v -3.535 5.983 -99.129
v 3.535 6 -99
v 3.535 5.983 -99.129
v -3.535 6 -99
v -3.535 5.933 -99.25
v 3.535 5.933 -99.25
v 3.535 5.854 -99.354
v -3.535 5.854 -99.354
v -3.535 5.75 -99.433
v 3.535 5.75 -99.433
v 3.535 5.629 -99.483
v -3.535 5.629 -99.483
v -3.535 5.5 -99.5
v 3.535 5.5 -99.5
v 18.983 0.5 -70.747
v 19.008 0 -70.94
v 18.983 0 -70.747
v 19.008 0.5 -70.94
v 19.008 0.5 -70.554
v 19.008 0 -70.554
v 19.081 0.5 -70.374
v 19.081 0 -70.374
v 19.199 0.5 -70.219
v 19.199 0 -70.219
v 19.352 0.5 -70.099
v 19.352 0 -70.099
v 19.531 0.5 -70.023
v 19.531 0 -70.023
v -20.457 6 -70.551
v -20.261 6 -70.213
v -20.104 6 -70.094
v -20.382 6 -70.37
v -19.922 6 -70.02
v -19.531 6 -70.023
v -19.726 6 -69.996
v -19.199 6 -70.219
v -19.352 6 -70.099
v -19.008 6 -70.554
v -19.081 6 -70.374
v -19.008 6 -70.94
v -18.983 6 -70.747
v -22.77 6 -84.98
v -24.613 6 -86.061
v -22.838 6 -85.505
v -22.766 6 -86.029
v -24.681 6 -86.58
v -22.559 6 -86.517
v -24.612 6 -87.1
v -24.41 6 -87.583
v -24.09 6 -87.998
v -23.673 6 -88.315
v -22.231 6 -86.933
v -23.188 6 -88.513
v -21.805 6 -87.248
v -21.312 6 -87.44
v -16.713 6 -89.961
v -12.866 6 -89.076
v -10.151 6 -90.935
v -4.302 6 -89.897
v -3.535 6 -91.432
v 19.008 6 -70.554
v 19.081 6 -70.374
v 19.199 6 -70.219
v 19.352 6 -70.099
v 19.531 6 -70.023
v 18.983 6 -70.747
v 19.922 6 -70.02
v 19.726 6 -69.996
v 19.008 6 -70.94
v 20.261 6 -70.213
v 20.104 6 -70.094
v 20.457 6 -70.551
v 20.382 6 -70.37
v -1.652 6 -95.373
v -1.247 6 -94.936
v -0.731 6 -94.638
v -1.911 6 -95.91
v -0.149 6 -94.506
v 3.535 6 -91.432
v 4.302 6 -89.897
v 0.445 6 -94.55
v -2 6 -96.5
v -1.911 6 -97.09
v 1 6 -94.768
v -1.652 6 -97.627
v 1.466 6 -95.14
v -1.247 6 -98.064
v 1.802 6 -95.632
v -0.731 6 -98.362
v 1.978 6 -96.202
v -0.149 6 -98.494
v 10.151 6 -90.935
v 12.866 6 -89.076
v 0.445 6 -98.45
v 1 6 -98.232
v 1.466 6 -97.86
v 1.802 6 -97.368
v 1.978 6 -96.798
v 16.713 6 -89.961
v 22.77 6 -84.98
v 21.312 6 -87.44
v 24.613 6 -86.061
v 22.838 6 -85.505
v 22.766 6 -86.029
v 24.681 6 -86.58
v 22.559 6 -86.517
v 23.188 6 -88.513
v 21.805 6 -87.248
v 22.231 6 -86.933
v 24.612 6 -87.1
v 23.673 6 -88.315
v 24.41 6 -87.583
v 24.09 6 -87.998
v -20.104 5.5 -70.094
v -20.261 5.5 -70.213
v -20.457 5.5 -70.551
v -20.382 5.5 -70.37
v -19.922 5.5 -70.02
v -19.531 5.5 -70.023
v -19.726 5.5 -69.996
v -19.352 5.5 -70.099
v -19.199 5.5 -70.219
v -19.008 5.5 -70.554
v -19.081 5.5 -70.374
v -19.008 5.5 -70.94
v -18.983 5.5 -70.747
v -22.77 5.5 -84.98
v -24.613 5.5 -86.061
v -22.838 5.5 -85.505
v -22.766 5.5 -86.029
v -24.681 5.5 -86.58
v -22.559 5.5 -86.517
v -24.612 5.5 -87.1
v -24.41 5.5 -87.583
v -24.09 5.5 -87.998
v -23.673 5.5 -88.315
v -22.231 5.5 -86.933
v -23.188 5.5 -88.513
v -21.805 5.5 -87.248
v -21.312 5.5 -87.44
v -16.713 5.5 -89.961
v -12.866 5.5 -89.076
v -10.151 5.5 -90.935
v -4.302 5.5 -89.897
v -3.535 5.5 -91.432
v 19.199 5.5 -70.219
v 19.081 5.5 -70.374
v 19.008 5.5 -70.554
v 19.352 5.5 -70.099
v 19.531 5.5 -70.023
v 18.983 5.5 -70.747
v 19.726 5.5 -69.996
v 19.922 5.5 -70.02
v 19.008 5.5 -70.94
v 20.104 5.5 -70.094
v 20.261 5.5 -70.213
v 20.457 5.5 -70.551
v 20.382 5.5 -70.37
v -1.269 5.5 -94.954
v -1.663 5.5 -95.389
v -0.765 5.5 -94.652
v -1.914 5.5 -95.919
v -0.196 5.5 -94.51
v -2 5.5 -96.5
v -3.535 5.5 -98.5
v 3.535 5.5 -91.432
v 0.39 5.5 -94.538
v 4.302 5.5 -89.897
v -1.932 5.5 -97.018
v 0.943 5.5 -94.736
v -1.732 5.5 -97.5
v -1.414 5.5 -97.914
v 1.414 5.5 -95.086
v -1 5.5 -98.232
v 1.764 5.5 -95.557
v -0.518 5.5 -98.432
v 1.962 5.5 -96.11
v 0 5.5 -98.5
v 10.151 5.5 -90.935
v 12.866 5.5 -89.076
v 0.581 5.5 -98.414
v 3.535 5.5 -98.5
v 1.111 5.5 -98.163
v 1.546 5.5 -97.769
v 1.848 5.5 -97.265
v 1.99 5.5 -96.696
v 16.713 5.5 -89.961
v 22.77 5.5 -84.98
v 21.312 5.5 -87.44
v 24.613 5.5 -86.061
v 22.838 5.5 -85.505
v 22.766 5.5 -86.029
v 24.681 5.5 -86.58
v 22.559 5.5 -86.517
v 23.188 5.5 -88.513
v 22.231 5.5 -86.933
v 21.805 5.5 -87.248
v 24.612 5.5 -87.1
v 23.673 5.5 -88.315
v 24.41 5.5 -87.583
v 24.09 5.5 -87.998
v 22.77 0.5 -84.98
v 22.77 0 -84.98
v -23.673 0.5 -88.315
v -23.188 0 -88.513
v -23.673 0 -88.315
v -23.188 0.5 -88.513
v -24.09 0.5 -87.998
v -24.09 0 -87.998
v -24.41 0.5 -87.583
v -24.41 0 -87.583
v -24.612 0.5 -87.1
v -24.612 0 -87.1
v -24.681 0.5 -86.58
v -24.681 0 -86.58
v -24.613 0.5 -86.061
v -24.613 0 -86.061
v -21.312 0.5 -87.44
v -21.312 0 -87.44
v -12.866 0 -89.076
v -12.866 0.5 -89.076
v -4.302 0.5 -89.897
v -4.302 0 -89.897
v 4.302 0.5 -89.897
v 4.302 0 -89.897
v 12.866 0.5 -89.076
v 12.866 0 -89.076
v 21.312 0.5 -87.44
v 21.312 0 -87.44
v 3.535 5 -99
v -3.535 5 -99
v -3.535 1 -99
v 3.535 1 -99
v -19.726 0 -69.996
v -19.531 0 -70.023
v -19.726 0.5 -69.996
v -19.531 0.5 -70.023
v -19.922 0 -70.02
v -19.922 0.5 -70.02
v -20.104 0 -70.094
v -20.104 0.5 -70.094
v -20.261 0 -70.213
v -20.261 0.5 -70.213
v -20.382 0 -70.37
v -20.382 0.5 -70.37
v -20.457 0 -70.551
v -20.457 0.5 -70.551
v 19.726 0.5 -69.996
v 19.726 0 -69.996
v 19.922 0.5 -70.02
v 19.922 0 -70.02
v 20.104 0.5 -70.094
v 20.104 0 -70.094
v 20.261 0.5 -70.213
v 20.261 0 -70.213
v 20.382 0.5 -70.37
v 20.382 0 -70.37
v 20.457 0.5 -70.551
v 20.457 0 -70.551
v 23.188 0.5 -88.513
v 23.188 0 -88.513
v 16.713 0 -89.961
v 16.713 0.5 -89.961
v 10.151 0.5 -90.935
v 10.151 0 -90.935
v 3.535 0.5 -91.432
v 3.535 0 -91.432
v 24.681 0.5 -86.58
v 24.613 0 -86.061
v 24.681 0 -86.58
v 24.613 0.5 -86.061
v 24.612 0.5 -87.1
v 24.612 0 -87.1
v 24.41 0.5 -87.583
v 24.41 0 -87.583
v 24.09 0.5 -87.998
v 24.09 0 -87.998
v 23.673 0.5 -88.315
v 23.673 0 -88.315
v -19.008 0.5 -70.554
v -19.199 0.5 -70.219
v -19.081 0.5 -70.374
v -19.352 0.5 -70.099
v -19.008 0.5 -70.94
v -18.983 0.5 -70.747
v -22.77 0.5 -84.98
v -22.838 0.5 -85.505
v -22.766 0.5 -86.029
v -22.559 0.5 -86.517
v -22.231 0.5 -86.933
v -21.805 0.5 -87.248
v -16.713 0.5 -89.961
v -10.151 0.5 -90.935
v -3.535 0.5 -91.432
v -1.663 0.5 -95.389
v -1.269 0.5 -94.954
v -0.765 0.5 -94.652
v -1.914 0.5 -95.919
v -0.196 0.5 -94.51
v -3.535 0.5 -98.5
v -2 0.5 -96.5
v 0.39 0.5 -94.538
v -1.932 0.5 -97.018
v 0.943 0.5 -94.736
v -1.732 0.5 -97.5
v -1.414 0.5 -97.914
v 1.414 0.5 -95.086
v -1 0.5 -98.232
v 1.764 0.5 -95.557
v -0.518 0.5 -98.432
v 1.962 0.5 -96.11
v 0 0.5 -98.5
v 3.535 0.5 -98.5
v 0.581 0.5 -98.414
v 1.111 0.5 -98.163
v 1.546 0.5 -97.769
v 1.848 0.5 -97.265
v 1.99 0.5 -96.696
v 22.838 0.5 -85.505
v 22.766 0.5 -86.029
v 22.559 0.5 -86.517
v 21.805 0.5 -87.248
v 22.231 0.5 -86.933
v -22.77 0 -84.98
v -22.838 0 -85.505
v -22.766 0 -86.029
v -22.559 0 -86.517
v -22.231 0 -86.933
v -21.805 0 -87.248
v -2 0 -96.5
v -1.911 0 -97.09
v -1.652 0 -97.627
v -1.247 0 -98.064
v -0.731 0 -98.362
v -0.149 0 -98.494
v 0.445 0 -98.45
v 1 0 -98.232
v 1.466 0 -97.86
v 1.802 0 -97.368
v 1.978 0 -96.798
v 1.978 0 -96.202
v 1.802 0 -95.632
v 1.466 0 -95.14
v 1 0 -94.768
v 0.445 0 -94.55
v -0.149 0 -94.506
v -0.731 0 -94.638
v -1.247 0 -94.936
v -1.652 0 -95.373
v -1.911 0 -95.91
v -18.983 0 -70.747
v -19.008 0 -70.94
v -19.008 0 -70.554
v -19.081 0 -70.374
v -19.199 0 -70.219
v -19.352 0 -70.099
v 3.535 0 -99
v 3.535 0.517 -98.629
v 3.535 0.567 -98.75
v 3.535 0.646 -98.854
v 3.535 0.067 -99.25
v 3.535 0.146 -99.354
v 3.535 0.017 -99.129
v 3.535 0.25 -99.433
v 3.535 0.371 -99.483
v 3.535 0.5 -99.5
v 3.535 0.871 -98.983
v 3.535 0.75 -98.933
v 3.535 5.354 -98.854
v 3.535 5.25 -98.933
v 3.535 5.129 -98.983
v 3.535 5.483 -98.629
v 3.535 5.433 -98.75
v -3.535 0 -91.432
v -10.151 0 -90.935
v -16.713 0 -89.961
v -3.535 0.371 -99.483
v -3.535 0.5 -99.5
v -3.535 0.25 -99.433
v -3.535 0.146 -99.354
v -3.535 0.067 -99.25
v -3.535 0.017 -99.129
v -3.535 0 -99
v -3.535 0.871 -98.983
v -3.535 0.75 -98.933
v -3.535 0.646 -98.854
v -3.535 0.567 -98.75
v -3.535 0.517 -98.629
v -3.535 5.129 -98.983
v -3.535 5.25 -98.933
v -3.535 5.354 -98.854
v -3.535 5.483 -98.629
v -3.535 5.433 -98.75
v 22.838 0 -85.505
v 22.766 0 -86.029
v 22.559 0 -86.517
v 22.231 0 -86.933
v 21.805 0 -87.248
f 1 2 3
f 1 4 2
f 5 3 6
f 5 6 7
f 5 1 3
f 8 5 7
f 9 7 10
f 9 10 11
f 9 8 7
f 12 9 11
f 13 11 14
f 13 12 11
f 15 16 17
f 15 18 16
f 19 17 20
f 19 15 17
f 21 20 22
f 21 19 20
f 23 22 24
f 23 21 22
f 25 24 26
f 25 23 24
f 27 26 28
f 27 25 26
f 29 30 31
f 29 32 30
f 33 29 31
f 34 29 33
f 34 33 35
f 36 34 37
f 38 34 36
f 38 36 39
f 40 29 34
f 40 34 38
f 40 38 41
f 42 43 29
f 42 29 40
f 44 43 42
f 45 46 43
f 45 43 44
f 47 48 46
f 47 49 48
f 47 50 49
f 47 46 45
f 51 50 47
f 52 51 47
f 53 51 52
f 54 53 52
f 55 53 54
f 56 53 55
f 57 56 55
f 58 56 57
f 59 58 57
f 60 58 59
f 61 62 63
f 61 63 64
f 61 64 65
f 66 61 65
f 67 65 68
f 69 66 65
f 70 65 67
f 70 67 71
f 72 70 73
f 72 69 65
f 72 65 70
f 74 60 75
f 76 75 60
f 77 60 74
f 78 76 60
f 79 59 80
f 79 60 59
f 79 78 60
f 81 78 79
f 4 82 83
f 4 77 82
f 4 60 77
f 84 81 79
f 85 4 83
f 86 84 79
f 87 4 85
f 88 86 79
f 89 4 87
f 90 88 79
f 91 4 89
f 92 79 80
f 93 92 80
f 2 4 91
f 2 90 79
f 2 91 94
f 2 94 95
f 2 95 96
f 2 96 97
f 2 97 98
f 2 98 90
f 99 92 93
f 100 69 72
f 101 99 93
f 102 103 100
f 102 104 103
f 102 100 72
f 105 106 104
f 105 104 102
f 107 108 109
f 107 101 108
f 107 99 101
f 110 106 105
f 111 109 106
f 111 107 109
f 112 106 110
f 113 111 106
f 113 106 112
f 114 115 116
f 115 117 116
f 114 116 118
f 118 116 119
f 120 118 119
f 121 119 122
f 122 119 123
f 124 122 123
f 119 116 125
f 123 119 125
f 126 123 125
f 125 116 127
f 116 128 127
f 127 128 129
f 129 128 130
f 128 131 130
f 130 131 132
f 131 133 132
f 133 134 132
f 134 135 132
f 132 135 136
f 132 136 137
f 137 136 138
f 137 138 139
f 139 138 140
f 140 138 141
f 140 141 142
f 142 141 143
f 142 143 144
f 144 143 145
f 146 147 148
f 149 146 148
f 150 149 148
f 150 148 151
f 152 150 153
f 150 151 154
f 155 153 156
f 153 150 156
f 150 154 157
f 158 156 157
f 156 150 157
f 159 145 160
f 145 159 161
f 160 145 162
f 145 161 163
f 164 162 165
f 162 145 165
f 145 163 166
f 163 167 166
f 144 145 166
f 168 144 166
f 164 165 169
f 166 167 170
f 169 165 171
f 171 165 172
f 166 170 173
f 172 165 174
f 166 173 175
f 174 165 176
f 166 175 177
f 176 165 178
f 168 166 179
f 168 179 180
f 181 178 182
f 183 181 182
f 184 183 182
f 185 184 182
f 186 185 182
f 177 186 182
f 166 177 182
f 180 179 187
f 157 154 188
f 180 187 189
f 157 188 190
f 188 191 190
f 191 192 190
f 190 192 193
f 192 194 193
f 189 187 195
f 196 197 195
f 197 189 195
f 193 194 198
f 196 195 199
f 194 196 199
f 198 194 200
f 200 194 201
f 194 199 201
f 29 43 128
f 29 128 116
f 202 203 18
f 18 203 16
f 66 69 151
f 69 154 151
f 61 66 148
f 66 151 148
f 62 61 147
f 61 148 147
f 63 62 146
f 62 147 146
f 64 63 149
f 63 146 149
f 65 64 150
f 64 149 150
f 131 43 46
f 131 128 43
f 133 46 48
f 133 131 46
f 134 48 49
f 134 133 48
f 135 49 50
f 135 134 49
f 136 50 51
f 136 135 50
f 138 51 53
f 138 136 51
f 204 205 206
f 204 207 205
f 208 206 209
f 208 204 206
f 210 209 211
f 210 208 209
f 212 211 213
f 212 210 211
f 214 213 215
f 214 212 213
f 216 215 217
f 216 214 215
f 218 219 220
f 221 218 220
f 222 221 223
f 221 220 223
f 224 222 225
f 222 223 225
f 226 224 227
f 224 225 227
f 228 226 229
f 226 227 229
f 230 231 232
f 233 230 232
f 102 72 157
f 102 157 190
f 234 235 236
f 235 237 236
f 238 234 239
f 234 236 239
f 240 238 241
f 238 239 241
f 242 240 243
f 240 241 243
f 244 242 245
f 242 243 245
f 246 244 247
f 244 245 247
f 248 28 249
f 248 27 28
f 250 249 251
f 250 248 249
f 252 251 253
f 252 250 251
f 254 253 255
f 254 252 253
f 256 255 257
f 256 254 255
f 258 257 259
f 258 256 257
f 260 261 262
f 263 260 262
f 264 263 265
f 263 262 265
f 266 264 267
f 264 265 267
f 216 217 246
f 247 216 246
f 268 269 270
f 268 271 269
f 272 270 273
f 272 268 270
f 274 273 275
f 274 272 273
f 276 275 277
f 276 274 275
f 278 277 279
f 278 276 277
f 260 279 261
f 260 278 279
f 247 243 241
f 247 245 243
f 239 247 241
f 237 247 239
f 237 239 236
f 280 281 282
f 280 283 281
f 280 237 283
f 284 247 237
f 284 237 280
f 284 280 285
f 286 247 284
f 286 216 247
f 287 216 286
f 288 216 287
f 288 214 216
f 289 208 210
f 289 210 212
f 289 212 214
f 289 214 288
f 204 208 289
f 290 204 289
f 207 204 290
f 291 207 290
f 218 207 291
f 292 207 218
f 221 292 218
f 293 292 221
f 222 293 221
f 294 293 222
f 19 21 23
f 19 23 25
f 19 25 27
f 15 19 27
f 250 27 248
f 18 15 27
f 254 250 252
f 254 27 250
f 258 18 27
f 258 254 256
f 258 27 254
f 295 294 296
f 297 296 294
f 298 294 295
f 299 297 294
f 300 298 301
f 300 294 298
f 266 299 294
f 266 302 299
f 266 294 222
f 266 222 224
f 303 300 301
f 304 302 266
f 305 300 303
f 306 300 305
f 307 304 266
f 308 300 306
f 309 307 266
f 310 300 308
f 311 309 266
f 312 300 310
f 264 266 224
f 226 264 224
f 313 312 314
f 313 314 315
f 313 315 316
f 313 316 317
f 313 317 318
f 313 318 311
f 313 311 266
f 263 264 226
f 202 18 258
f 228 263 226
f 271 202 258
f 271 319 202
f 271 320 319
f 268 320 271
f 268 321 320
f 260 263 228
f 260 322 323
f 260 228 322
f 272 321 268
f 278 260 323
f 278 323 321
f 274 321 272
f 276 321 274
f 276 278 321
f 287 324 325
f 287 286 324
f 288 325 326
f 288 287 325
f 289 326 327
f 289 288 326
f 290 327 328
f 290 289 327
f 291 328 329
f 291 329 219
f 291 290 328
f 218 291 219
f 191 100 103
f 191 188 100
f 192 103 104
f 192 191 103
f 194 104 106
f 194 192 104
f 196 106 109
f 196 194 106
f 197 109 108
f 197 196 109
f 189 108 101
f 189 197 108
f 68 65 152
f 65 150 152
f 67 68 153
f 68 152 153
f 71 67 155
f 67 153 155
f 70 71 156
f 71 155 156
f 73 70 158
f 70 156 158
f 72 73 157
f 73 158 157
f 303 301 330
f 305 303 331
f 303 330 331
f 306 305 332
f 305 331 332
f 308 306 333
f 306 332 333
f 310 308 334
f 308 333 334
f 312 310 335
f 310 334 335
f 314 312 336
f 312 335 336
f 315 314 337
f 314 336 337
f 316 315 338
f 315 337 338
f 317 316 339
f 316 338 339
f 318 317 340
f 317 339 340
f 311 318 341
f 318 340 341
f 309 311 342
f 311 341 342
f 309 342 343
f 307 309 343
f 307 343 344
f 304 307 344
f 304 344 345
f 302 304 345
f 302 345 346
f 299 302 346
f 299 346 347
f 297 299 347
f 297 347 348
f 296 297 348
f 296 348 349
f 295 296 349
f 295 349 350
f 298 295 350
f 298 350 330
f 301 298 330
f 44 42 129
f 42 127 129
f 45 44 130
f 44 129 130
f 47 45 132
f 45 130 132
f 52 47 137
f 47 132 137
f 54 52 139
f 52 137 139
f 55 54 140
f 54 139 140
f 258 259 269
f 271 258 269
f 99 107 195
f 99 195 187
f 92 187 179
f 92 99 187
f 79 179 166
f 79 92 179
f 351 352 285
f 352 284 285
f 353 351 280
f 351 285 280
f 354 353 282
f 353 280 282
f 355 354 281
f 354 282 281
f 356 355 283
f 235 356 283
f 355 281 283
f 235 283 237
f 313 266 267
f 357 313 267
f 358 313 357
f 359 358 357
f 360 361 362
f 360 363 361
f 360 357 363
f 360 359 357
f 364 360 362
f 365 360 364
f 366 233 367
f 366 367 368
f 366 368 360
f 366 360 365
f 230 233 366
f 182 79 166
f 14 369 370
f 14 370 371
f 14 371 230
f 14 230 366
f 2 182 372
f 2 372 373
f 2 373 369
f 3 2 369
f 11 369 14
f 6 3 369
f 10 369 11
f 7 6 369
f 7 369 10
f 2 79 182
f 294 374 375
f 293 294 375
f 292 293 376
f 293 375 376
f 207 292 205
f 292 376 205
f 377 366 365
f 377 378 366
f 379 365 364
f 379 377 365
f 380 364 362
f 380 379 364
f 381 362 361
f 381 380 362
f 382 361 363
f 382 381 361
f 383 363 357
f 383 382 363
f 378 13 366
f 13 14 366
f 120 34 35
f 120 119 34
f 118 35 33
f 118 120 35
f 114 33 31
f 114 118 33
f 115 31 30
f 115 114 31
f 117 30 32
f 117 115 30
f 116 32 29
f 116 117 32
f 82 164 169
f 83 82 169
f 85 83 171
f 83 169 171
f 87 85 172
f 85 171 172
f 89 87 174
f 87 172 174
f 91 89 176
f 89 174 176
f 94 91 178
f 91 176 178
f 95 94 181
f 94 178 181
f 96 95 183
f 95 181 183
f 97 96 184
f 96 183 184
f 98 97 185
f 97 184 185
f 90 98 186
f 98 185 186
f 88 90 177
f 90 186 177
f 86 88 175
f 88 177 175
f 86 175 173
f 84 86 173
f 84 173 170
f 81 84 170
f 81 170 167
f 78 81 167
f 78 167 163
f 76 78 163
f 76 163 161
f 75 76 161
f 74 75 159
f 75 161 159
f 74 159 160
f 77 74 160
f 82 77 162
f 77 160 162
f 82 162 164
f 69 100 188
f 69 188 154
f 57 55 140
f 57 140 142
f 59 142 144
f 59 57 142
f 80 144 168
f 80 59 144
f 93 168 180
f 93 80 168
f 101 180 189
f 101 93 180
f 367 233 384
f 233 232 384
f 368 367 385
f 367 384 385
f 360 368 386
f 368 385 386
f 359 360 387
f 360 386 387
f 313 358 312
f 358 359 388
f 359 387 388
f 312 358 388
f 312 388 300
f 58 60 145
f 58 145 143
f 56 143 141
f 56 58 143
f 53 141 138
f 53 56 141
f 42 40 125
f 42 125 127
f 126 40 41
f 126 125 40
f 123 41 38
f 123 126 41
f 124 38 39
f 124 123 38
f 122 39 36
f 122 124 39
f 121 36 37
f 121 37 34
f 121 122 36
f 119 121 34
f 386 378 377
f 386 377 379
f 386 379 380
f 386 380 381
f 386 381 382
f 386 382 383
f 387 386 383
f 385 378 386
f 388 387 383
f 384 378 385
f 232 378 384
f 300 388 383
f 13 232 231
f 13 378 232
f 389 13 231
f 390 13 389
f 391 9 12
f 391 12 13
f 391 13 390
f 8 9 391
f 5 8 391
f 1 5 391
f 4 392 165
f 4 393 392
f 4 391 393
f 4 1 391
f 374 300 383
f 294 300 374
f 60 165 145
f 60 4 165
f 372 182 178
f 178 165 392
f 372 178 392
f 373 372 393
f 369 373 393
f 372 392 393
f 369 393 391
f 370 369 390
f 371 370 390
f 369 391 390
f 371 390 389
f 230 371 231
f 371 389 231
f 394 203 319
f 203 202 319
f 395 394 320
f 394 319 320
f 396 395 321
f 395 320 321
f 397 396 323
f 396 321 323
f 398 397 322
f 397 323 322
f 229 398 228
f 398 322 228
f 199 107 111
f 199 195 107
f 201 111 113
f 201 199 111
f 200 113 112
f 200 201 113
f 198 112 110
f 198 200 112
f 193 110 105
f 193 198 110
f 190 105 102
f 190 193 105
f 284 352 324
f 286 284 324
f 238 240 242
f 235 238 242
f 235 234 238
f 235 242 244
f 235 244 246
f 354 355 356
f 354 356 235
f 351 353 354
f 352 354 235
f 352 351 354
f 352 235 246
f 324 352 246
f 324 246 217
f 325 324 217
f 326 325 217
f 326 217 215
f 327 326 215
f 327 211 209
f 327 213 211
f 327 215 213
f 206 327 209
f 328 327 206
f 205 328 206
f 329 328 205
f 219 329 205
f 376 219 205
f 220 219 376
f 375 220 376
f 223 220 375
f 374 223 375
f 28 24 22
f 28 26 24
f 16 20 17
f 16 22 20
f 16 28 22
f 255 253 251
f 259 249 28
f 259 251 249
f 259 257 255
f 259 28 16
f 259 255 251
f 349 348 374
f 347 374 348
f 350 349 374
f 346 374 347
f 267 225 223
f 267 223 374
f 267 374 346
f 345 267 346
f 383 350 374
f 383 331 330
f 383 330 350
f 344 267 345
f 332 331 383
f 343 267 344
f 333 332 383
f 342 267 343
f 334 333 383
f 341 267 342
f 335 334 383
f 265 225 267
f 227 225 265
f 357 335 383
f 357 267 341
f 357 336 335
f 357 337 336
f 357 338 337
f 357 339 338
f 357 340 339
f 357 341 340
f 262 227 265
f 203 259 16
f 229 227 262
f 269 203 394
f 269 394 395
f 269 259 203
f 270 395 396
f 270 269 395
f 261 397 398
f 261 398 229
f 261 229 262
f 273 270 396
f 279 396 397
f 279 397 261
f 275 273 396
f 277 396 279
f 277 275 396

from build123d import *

# Parameters (mm, degrees)
BOSS_EXTRUDE1_DEPTH   = 0.5
FILLET3_R             = 2
FILLET4_R             = 0.75
FILLET5_R             = 0.75
SKETCH2_W             = 0.5
SKETCH2_H             = 3
BOSS_EXTRUDE2_DEPTH   = 7.070737889
FILLET3_OF_MIRROR5_R  = 2
FILLET4_OF_MIRROR5_R  = 0.75
FILLET5_OF_MIRROR5_R  = 0.75
FILLET7_R             = 0.5
F_4_0MM_DOWEL_HOLE1_D = 4


with BuildPart() as part:
    # Sketch1 → Boss-Extrude1 (new body)
    with BuildSketch(Plane(origin=(0, 0, 0), x_dir=(1, 0, 0), z_dir=(0, 1, 0))):
        with BuildLine():
            Line((23.293714059, 86.933324366), (18.816144579, 70.222807571))
            Line((18.816144579, 70.222807571), (20.261027783, 69.819630142))
            Line((20.261027783, 69.819630142), (25.127648951, 87.982107603))
            ThreePointArc((25.127648951, 87.982107603), (14.434923875, 90.354208384), (3.535368944, 91.431674853))
            Line((3.535368944, 91.431674853), (3.535368944, 99))
            Line((3.535368944, 99), (-3.535368944, 99))
            Line((-3.535368944, 99), (-3.535368944, 91.431674853))
            ThreePointArc((-3.535368944, 91.431674853), (-14.434923875, 90.354208384), (-25.127648951, 87.982107603))
            Line((-25.127648951, 87.982107603), (-20.261027783, 69.819630142))
            Line((-20.261027783, 69.819630142), (-18.816144579, 70.222807571))
            Line((-18.816144579, 70.222807571), (-23.293714059, 86.933324366))
            ThreePointArc((-23.293714059, 86.933324366), (0, 90), (23.293714059, 86.933324366))
        make_face()
    boss_extrude1 = extrude(amount=BOSS_EXTRUDE1_DEPTH)

    # Fillet3
    fillet3_edges = [part.edges().sort_by_distance(p)[0] for p in [
        (-23.293714059, 0.25, -86.933324366),
        (-25.127648951, 0.25, -87.982107603),
        (25.127648951, 0.25, -87.982107603),
        (23.293714059, 0.25, -86.933324366),
    ]]
    fillet(fillet3_edges, radius=FILLET3_R)

    # Fillet4
    fillet4_edges = [part.edges().sort_by_distance(p)[0] for p in [
        (-18.816144579, 0.25, -70.222807571),
        (-20.261027783, 0.25, -69.819630142),
    ]]
    fillet(fillet4_edges, radius=FILLET4_R - 0.0001)  # a hair under: the kernel refuses the full size

    # Fillet5
    fillet5_edges = [part.edges().sort_by_distance(p)[0] for p in [
        (20.261027783, 0.25, -69.819630142),
        (18.816144579, 0.25, -70.222807571),
    ]]
    fillet(fillet5_edges, radius=FILLET5_R - 0.0001)  # a hair under: the kernel refuses the full size

    # Sketch2 → Boss-Extrude2 (add)
    with BuildSketch(Plane(origin=(3.535368944, 0, 0), x_dir=(0, 0, -1), z_dir=(1, 0, 0))):
        with Locations((99.25, 1.5)):
            Rectangle(SKETCH2_W, SKETCH2_H)
    boss_extrude2 = extrude(amount=-BOSS_EXTRUDE2_DEPTH)

    # Mirror3: Boss-Extrude2 across plane
    add(boss_extrude2.mirror(Plane.ZX.offset(3)))

    # Mirror5: Boss-Extrude1 across plane
    add(boss_extrude1.mirror(Plane.ZX.offset(3)))

    # Fillet3 of Mirror5
    fillet3_of_mirror5_edges = [part.edges().sort_by_distance(p)[0] for p in [
        (-23.293714059, 5.75, -86.933324366),
        (-25.127648951, 5.75, -87.982107603),
        (25.127648951, 5.75, -87.982107603),
        (23.293714059, 5.75, -86.933324366),
    ]]
    fillet(fillet3_of_mirror5_edges, radius=FILLET3_OF_MIRROR5_R)

    # Fillet4 of Mirror5
    fillet4_of_mirror5_edges = [part.edges().sort_by_distance(p)[0] for p in [
        (-18.816144579, 5.75, -70.222807571),
        (-20.261027783, 5.75, -69.819630142),
    ]]
    fillet(fillet4_of_mirror5_edges, radius=FILLET4_OF_MIRROR5_R - 0.0001)  # a hair under: the kernel refuses the full size

    # Fillet5 of Mirror5
    fillet5_of_mirror5_edges = [part.edges().sort_by_distance(p)[0] for p in [
        (20.261027783, 5.75, -69.819630142),
        (18.816144579, 5.75, -70.222807571),
    ]]
    fillet(fillet5_of_mirror5_edges, radius=FILLET5_OF_MIRROR5_R - 0.0001)  # a hair under: the kernel refuses the full size

    # Fillet7
    fillet7_edges = [part.edges().sort_by_distance(p)[0] for p in [
        (0, 5.5, -99),
        (0, 0.5, -99),
        (0, 0, -99.5),
        (0, 6, -99.5),
    ]]
    fillet(fillet7_edges, radius=FILLET7_R)

    # Ø4.0mm Dowel Hole1 (through all)
    with Locations(Plane(origin=(0, 6, 0), x_dir=(1, 0, 0), z_dir=(0, 1, 0))):
        with Locations((0, 96.5)):
            Hole(F_4_0MM_DOWEL_HOLE1_D / 2)


solid = part.part
